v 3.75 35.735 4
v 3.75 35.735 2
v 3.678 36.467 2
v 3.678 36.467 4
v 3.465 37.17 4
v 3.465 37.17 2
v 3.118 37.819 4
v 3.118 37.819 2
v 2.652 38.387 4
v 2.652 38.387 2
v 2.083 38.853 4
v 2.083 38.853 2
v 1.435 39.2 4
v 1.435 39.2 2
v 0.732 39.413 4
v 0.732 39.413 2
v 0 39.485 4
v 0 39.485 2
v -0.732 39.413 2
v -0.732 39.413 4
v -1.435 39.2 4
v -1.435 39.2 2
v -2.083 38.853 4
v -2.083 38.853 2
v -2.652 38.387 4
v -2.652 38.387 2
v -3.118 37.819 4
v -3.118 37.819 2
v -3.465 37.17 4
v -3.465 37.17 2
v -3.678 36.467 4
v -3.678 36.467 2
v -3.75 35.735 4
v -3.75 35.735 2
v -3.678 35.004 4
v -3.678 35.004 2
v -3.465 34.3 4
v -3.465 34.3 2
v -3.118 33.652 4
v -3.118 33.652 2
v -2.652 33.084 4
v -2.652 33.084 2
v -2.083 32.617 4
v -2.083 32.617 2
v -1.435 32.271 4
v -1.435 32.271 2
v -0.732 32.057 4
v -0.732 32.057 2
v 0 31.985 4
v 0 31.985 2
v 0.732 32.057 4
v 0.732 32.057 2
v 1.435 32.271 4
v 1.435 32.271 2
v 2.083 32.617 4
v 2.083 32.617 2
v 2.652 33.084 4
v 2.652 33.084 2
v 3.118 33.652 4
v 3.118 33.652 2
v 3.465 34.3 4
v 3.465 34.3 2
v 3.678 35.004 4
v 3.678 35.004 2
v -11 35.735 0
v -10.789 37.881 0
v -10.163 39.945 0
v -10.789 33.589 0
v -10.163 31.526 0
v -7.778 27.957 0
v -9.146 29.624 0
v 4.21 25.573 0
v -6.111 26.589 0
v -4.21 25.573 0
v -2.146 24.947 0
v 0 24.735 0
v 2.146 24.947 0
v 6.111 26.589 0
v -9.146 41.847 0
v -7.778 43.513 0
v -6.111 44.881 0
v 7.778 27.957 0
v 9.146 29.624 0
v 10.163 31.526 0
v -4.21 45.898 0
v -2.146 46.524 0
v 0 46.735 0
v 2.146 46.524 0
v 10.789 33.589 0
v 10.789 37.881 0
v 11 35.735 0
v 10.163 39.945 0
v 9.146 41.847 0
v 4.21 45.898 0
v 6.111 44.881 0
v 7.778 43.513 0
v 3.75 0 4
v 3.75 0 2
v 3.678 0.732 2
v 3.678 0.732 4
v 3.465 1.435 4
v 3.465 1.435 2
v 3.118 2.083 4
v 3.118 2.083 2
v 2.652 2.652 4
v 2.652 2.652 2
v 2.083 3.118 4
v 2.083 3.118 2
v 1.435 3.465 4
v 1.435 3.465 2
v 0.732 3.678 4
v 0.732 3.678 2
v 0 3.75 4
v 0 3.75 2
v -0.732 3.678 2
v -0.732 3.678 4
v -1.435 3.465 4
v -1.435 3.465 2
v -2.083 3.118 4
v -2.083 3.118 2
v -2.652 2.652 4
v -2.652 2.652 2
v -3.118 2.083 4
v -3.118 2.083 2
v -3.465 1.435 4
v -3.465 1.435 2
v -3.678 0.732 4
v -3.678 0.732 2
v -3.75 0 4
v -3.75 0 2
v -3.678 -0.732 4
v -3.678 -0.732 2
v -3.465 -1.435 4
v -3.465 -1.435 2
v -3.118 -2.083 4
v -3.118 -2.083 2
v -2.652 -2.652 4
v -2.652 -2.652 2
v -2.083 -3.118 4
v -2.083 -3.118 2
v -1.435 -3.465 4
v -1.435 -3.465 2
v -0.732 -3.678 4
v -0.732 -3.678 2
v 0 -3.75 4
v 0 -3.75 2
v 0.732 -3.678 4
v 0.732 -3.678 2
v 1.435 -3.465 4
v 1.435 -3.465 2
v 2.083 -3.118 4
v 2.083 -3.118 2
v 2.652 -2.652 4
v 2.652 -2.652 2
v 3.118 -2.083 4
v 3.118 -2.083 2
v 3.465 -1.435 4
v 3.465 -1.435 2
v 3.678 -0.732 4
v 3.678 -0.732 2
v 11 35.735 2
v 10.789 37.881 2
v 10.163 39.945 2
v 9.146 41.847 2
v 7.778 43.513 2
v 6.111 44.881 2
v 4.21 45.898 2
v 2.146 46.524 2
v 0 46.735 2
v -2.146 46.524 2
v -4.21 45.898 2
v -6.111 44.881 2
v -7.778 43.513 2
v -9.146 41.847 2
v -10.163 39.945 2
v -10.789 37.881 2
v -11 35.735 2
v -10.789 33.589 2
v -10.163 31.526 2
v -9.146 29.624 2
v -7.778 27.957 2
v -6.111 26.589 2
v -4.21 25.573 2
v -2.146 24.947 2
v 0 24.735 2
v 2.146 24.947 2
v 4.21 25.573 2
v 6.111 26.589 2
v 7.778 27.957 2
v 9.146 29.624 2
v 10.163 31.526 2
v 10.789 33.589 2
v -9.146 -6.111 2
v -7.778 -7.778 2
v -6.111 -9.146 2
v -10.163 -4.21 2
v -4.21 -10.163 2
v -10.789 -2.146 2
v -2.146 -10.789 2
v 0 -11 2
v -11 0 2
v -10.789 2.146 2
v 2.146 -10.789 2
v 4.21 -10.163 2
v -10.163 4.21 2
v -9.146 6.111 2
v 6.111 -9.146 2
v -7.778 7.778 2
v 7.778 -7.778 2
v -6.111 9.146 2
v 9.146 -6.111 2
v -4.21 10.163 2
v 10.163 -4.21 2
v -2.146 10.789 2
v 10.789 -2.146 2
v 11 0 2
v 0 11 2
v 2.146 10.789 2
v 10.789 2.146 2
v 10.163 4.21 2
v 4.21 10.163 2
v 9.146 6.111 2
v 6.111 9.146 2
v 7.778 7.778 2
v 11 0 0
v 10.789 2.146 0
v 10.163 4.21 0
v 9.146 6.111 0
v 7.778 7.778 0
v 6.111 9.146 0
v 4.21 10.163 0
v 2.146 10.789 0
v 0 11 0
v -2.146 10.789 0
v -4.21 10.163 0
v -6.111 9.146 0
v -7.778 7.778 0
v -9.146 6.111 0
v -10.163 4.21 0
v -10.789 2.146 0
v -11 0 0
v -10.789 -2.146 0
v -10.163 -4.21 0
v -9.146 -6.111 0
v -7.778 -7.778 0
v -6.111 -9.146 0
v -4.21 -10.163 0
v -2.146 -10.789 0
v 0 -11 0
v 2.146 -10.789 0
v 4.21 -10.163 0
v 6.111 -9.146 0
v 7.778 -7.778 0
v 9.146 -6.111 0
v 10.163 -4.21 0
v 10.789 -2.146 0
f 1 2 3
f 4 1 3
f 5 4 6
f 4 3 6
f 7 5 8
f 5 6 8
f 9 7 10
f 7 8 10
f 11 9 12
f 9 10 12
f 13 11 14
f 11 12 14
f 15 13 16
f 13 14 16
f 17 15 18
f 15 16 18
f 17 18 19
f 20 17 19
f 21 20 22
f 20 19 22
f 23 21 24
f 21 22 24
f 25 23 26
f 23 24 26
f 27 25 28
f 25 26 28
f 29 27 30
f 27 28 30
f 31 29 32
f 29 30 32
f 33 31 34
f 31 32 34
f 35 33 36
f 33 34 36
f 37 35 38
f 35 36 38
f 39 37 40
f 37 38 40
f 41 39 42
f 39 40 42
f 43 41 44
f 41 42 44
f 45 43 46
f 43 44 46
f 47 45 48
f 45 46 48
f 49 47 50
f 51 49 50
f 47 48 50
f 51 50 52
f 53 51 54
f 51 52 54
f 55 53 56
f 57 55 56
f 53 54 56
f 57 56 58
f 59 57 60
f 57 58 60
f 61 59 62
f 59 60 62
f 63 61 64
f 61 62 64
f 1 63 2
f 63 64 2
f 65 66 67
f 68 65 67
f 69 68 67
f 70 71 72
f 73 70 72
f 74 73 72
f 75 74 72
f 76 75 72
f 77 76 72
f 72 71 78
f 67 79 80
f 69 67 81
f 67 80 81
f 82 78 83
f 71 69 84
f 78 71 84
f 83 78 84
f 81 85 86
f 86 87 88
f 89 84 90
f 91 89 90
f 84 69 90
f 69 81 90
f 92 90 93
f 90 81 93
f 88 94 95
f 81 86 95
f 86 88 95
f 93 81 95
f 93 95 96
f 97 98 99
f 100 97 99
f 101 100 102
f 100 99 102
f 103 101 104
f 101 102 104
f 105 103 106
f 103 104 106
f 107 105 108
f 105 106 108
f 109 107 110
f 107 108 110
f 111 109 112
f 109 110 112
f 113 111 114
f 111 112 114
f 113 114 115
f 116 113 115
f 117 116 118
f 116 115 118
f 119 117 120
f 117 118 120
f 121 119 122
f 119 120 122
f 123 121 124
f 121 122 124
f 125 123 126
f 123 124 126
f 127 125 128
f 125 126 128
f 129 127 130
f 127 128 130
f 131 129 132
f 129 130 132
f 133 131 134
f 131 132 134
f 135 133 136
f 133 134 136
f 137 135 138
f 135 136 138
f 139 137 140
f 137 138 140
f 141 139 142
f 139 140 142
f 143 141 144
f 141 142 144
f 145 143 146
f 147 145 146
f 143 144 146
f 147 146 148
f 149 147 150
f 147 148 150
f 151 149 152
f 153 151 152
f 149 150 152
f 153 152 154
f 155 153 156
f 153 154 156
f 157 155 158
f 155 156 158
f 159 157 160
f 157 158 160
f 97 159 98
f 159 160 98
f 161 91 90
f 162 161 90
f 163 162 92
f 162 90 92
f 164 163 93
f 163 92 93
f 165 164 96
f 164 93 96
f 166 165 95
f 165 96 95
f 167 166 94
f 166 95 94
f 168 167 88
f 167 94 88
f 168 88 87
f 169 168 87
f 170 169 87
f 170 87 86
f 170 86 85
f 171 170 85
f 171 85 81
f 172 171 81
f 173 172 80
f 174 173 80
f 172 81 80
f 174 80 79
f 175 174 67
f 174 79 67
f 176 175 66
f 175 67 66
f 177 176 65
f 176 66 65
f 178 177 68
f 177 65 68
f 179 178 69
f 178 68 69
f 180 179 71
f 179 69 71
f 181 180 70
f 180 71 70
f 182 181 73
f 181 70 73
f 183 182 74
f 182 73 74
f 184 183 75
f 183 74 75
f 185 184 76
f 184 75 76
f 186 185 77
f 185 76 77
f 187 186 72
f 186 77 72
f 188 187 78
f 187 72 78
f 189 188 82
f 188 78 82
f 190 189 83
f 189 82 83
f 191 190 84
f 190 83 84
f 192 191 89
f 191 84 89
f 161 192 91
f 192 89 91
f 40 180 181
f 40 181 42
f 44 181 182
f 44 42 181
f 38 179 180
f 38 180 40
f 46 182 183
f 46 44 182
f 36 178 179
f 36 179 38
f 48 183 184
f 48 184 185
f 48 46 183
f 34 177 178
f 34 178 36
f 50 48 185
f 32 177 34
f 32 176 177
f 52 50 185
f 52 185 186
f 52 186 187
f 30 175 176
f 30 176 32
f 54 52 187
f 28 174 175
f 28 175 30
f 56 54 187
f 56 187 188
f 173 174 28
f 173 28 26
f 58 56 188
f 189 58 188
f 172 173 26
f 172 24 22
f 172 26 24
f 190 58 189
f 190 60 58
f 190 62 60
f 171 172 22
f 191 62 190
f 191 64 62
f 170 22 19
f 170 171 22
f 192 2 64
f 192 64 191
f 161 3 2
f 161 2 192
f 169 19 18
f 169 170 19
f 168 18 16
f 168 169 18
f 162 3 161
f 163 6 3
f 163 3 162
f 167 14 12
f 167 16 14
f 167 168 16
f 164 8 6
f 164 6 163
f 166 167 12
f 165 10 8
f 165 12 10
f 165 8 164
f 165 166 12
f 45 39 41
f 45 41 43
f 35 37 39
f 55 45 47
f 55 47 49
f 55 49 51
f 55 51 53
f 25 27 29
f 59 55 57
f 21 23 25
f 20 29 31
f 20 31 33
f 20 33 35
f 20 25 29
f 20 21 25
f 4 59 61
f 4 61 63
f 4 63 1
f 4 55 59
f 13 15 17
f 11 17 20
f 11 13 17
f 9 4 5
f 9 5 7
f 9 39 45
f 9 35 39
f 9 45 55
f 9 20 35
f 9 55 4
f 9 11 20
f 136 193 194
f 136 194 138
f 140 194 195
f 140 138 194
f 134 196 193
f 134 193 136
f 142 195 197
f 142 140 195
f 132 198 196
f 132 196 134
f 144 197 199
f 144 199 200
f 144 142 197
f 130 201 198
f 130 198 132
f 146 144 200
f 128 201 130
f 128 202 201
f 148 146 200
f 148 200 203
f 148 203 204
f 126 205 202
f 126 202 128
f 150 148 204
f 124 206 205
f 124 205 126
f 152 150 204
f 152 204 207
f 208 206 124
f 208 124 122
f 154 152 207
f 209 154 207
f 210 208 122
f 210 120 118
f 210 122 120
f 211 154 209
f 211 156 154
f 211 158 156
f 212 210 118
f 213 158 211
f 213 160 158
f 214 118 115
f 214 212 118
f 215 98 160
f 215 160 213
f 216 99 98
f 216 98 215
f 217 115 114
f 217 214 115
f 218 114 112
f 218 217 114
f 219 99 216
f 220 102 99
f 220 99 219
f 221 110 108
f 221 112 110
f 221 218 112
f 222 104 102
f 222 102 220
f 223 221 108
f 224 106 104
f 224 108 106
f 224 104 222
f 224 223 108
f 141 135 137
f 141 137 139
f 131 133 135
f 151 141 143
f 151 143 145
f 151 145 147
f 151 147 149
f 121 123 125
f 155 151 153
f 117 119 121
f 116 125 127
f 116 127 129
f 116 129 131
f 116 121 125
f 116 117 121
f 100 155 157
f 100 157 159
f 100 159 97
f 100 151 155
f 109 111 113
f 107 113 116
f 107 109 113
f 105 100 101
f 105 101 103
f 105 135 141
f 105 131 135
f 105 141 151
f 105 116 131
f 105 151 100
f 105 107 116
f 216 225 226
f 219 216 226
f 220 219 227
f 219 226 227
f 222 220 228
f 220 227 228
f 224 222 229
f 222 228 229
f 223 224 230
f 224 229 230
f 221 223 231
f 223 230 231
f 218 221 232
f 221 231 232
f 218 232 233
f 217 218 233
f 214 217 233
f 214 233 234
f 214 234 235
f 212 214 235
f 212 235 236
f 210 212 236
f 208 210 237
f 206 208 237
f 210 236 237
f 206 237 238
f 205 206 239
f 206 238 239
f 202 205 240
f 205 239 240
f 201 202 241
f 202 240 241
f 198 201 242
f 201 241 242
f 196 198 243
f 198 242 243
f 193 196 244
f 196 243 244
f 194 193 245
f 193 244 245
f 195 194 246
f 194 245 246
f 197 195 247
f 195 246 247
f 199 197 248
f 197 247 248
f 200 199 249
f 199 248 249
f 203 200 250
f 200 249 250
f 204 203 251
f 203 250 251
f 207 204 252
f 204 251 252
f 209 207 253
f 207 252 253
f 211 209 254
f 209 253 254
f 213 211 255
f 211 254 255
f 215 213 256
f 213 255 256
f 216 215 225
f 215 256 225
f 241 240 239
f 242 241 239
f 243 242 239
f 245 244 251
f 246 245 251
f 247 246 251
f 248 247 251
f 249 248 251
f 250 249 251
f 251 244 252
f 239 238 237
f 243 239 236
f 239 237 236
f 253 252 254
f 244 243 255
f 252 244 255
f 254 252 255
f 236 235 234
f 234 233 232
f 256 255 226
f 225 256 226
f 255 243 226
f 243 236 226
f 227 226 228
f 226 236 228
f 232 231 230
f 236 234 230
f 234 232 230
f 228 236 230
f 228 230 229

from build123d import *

# Parameters (mm, degrees)
F0_R     = 11
F1_DEPTH = 2
F2_R     = 3.75
F3_DEPTH = 2


with BuildPart() as f1:
    # F0 (on Top) → F1 (new body)
    with BuildSketch(Plane.XY):
        Circle(F0_R)
        with Locations((0, 35.735294)):
            Circle(F0_R)
    extrude(amount=F1_DEPTH)

    # F2 (on face) → F3 (join)
    with BuildSketch(Plane.XY.offset(2)):
        Circle(F2_R)
        with Locations((0, 35.735294)):
            Circle(F2_R)
    extrude(amount=F3_DEPTH)


solid = f1.part
